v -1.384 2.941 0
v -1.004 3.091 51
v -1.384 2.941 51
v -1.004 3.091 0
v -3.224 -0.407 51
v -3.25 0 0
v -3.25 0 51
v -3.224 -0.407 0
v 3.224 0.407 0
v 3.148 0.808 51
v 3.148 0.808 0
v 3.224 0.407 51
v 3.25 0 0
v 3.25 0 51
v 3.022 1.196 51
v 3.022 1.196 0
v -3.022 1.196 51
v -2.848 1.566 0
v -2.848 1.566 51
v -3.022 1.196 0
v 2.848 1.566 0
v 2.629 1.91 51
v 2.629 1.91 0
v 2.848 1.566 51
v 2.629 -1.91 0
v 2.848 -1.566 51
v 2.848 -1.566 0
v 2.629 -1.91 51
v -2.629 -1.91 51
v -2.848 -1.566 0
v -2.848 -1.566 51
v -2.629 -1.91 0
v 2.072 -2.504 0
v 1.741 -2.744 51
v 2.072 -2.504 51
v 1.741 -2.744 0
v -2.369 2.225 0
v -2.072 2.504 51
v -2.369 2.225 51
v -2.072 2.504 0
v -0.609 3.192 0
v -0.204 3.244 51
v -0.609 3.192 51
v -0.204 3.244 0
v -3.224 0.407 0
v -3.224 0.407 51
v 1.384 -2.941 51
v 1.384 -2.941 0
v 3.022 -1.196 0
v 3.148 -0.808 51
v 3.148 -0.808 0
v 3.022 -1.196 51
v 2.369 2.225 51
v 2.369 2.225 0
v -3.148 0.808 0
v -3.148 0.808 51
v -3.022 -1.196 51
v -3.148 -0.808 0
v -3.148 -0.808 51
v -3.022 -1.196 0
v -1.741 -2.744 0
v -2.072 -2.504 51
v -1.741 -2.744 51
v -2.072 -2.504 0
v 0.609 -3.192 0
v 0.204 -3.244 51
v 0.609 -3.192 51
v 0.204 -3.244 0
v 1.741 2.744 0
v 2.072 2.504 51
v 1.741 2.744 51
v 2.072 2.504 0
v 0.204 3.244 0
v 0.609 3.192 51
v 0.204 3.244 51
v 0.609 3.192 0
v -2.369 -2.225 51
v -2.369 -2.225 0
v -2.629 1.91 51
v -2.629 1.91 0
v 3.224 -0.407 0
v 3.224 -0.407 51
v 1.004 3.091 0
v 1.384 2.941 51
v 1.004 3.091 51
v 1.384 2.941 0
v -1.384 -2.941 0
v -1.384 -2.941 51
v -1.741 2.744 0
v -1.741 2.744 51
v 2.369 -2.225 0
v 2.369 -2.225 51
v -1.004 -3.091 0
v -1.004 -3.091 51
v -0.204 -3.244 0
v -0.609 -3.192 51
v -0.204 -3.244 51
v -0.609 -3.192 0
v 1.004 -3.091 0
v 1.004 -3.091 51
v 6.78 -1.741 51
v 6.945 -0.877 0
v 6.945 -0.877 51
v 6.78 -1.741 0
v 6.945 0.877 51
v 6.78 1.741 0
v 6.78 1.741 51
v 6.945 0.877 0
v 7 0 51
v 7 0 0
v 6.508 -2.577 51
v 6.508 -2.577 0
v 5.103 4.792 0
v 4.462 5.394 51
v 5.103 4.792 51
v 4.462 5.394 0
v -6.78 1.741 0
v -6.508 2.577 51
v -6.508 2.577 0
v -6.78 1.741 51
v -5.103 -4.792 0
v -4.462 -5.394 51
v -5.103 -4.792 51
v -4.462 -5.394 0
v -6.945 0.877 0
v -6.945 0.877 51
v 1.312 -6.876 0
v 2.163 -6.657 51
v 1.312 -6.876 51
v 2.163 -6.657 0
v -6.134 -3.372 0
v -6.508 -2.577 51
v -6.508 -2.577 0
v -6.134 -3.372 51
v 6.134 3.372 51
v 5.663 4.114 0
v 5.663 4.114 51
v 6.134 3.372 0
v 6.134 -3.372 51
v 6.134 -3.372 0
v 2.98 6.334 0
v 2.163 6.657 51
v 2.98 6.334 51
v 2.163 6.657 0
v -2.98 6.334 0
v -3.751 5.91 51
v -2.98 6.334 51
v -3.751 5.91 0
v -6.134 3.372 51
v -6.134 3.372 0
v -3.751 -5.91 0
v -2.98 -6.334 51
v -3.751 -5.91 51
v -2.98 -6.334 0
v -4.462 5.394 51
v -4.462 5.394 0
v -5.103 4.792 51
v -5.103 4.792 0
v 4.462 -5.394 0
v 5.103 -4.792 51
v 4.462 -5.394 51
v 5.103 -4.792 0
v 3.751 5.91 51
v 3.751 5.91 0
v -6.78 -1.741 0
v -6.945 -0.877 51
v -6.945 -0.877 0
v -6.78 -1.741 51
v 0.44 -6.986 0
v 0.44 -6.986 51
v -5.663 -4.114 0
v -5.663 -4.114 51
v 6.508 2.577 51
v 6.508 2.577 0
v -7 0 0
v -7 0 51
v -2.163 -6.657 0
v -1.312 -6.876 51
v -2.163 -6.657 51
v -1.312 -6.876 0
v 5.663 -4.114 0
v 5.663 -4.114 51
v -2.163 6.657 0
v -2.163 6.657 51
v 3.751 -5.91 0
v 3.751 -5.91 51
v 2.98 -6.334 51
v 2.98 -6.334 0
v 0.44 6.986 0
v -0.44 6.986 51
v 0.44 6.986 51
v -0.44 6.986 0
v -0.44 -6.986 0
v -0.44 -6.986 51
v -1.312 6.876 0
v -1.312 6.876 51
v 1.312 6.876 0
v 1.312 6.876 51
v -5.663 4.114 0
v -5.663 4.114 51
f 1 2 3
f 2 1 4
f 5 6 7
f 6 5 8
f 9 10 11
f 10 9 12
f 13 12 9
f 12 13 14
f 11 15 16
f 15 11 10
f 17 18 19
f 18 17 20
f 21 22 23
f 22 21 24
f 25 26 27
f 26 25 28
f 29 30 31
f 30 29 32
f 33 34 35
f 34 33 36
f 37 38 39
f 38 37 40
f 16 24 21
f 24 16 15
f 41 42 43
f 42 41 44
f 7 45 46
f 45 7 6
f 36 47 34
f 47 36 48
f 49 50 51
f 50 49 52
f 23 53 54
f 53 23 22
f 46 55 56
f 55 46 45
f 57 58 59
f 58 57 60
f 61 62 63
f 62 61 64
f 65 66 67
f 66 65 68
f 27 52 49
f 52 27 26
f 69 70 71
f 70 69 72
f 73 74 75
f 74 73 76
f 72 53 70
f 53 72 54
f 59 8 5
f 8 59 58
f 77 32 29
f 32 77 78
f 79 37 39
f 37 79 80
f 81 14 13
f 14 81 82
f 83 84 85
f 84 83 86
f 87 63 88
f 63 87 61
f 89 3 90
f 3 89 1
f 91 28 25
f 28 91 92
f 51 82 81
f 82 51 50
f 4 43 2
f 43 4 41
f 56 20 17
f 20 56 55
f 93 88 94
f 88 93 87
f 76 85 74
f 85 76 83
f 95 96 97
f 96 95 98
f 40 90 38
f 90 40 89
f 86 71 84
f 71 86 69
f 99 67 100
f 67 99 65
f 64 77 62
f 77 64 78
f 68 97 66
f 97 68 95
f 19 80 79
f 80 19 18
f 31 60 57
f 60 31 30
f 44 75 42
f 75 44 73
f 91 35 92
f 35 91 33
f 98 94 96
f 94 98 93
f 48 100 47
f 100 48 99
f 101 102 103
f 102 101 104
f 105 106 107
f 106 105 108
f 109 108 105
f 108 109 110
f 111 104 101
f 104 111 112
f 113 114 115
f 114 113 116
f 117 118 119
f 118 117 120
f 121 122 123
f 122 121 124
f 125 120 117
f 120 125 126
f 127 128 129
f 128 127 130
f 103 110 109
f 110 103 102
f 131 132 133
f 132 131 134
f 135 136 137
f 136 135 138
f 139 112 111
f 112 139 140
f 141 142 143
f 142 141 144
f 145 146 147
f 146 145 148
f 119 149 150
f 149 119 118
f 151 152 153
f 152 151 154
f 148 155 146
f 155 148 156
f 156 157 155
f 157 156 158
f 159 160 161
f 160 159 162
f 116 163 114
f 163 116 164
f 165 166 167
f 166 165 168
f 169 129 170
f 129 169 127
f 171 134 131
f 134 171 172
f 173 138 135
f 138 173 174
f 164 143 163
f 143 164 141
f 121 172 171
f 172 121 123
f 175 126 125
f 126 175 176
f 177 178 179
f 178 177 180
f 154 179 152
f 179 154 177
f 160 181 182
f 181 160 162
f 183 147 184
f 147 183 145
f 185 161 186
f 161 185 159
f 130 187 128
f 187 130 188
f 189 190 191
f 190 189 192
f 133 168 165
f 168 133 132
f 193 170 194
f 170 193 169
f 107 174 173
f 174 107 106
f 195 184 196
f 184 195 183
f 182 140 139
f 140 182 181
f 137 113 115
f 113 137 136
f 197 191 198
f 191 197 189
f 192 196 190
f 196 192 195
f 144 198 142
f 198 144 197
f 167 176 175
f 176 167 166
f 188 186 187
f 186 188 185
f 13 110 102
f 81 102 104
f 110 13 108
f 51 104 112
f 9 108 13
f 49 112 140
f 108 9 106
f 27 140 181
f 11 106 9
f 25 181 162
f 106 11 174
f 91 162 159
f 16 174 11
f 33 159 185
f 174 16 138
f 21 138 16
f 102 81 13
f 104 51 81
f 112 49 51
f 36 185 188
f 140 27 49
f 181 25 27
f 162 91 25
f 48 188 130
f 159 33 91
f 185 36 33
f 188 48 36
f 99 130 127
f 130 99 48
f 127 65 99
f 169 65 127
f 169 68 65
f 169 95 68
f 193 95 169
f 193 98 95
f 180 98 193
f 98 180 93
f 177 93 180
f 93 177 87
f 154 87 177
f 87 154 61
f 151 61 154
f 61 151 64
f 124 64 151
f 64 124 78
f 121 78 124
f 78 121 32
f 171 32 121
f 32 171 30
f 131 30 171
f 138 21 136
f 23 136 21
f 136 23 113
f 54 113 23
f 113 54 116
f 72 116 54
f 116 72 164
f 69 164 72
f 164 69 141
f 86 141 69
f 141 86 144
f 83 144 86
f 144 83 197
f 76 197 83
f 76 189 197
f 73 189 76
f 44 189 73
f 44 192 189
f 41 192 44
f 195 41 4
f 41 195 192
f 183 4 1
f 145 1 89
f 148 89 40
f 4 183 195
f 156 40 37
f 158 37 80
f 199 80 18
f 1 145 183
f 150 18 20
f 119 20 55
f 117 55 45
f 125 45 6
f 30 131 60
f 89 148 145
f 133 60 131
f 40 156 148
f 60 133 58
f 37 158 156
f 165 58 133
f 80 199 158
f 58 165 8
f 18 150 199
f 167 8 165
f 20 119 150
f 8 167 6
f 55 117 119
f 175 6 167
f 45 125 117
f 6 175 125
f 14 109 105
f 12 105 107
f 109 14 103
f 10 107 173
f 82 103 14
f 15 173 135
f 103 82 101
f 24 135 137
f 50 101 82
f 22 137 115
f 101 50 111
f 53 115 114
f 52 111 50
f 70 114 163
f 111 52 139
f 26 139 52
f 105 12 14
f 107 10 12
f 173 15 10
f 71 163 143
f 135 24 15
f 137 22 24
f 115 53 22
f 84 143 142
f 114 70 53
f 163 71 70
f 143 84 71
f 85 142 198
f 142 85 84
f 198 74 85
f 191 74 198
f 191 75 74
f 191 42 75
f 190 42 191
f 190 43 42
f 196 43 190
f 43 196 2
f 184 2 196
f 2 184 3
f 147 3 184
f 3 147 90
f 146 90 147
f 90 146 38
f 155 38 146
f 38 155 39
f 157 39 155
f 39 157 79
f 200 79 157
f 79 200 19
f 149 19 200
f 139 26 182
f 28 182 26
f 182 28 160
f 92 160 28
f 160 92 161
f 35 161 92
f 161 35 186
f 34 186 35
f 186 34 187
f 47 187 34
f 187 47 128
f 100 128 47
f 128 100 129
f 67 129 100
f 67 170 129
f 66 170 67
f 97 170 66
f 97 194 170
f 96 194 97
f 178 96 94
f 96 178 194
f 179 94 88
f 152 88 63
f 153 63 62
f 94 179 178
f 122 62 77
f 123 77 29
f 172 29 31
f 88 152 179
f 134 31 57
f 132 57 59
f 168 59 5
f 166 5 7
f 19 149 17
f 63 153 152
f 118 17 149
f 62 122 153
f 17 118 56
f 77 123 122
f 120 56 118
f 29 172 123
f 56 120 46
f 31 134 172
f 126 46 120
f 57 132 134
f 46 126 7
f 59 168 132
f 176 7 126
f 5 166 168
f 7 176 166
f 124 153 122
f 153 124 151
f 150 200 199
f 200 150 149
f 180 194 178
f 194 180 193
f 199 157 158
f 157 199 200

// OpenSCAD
$fn = 50;


difference() {
	union() {
		*color(alpha = 1.0000000000, c = "gray") {
			translate(v = [0, 7, 0]) {
				linear_extrude(height = 1) {
					text(font = "Arial:style=Bold", halign = "center", size = 4.5000000000, text = "COMMENT plate main", valign = "center");
				}
			}
		}
		cylinder(h = 51, r = 7.0000000000);
	}
	union() {
		*color(alpha = 1.0000000000, c = "gray") {
			translate(v = [0, 7, 0]) {
				linear_extrude(height = 1) {
					text(font = "Arial:style=Bold", halign = "center", size = 4.5000000000, text = "COMMENT holes main", valign = "center");
				}
			}
		}
		translate(v = [0, 0, -100]) {
			cylinder(h = 200, r = 3.2500000000);
		}
		translate(v = [0, 0, -100]) {
			cylinder(h = 200, r = 1.8000000000);
		}
	}
}
